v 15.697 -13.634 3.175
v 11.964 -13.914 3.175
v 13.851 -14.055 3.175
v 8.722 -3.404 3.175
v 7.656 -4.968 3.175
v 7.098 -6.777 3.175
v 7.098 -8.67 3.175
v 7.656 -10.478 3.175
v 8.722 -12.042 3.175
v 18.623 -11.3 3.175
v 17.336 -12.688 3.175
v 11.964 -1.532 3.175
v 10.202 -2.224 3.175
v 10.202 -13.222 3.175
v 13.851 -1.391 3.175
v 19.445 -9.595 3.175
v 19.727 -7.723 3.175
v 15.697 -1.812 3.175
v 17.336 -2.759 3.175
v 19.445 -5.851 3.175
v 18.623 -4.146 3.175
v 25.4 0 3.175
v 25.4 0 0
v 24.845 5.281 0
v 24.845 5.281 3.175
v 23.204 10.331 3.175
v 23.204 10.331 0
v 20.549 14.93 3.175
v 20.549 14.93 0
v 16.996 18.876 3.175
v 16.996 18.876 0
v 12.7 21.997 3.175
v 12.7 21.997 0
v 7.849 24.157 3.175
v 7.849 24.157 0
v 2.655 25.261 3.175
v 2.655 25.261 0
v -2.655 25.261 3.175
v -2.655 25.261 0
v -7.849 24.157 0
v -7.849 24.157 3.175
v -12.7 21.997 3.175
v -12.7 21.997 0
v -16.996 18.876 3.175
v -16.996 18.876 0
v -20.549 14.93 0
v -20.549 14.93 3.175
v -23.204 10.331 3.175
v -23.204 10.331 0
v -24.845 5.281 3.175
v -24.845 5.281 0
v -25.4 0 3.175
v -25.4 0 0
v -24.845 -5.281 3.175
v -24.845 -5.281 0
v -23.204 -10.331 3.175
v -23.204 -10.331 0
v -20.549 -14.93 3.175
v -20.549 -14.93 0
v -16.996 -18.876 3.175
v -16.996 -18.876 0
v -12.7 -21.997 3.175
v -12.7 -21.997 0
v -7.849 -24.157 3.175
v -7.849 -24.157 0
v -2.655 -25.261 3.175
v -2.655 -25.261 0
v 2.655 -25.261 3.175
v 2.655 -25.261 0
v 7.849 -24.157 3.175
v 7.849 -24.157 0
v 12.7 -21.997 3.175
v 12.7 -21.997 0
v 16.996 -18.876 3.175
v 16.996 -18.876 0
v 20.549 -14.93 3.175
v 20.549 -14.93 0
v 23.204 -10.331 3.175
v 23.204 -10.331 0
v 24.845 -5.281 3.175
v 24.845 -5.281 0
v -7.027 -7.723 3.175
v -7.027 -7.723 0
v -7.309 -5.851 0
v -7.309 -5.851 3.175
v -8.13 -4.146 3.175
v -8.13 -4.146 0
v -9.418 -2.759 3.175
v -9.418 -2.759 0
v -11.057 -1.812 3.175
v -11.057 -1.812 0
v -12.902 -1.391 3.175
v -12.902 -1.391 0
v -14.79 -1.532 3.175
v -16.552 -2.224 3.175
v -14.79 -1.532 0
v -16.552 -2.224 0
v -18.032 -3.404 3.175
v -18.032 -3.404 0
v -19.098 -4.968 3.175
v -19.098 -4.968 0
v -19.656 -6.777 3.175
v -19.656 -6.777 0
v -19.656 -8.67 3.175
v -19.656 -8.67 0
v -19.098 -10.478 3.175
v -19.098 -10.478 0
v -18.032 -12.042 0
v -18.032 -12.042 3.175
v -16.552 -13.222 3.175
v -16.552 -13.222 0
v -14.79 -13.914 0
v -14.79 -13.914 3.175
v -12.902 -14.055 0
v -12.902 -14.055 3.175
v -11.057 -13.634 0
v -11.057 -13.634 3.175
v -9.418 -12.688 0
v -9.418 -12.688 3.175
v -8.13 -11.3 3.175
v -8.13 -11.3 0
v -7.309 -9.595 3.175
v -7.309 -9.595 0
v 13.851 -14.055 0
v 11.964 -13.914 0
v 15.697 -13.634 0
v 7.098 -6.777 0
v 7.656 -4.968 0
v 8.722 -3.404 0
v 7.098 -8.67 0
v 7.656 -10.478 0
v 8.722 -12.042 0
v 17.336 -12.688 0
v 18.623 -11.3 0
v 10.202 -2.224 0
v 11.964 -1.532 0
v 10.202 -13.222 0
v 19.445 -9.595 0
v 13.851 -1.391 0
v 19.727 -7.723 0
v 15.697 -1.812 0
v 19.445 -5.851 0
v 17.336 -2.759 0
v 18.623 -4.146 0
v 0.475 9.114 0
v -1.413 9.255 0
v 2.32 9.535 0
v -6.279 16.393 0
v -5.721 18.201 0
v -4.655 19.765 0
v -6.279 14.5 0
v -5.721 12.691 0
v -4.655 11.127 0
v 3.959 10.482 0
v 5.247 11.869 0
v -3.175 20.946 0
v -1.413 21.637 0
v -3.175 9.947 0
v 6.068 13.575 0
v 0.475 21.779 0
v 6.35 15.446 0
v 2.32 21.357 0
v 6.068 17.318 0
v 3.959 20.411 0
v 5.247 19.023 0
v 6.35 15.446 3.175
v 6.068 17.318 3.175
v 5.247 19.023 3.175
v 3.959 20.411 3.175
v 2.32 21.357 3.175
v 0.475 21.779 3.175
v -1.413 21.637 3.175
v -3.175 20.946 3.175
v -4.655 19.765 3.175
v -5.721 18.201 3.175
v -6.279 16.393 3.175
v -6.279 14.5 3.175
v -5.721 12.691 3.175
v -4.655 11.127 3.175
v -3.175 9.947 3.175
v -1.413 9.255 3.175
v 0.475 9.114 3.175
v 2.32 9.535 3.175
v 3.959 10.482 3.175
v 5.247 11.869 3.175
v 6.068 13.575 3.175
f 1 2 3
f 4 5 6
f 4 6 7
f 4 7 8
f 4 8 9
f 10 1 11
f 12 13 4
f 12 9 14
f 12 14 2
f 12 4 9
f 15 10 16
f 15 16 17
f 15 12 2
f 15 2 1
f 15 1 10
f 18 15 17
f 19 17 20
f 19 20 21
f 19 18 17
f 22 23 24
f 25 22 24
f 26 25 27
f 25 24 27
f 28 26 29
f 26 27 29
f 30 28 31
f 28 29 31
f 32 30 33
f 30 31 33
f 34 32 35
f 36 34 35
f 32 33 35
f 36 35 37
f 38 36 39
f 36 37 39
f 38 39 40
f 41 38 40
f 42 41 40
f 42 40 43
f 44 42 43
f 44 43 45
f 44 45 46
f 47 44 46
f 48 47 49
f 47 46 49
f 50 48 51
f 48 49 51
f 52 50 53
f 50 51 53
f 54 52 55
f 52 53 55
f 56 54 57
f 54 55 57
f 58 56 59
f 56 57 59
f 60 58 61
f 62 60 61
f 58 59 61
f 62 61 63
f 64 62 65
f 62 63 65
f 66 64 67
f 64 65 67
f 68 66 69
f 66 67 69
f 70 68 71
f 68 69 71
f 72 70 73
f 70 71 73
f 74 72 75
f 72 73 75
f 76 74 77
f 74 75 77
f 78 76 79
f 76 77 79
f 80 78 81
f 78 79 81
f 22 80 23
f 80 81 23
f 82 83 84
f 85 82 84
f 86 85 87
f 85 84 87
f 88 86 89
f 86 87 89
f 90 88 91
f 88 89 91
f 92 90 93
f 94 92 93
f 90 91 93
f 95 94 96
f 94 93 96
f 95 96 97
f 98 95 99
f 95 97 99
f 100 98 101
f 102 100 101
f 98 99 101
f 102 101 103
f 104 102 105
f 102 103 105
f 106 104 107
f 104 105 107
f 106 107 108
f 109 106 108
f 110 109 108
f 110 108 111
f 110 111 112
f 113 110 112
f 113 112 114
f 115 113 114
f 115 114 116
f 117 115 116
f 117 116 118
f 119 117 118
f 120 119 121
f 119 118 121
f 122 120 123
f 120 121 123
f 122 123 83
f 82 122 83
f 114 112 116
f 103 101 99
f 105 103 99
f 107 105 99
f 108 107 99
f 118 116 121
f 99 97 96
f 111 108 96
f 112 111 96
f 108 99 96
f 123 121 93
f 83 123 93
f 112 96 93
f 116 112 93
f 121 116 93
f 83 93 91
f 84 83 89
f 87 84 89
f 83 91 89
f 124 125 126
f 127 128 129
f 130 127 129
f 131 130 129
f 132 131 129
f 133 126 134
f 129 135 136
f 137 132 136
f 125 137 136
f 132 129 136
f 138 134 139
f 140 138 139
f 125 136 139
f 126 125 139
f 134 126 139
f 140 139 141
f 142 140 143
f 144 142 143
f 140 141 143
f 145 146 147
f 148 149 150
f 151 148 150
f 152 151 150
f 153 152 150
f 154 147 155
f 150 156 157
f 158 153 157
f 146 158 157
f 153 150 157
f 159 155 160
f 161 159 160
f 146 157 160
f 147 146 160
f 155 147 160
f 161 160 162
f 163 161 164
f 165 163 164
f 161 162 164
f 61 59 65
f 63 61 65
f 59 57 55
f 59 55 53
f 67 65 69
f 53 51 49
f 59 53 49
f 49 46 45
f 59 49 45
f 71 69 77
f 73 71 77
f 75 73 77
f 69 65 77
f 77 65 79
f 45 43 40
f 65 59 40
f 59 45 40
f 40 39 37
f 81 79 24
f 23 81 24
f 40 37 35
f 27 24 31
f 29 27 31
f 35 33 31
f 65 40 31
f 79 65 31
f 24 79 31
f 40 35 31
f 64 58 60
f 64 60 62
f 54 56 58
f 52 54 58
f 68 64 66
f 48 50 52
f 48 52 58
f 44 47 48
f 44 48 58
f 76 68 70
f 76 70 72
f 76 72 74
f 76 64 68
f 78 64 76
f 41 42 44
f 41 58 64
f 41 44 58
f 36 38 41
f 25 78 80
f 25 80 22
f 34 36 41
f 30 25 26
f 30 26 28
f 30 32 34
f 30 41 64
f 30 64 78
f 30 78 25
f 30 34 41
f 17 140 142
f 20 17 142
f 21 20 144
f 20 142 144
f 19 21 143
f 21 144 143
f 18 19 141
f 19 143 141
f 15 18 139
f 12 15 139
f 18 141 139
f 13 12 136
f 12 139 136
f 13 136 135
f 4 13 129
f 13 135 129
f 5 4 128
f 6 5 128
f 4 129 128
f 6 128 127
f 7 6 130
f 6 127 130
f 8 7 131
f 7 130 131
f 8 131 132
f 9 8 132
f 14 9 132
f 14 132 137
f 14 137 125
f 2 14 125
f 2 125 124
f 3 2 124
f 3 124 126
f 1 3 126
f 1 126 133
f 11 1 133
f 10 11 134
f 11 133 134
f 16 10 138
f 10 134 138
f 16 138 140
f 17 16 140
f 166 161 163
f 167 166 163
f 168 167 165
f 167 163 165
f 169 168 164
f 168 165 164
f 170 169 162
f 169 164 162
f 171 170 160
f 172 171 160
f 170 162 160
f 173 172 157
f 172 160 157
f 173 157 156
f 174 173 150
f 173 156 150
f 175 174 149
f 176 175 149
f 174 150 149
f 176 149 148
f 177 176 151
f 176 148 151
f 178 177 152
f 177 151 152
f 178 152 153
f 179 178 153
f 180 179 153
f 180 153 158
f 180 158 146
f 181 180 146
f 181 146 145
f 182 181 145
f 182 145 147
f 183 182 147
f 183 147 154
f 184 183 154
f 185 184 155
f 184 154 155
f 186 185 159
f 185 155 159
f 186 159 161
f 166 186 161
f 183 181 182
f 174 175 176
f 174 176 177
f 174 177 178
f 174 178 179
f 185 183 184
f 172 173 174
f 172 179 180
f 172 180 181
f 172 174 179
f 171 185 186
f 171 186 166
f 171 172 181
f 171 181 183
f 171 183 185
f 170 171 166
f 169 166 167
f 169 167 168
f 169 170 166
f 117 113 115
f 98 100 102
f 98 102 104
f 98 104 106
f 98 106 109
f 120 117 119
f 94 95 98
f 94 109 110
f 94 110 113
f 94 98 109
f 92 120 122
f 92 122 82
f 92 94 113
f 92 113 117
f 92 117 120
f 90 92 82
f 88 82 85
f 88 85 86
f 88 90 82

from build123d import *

# Parameters (mm, degrees)
F0_R     = 25.4
F1_DEPTH = 3.175
F2_R     = 6.35
F3_DEPTH = 3.175


with BuildPart() as f1:
    # F0 (on Top) → F1 (new body)
    with BuildSketch(Plane.XY):
        Circle(F0_R)
    extrude(amount=F1_DEPTH)


with BuildPart() as f3:
    # F2 (on Top) → F3 (new body, through all)
    with BuildSketch(Plane.XY):
        with Locations((0, 15.446283)):
            Circle(F2_R)
        with Locations((-13.376873, -7.723141)):
            Circle(F2_R)
        with Locations((13.376873, -7.723141)):
            Circle(F2_R)
    extrude(amount=F3_DEPTH)


solid = Compound([f1.part, f3.part])
